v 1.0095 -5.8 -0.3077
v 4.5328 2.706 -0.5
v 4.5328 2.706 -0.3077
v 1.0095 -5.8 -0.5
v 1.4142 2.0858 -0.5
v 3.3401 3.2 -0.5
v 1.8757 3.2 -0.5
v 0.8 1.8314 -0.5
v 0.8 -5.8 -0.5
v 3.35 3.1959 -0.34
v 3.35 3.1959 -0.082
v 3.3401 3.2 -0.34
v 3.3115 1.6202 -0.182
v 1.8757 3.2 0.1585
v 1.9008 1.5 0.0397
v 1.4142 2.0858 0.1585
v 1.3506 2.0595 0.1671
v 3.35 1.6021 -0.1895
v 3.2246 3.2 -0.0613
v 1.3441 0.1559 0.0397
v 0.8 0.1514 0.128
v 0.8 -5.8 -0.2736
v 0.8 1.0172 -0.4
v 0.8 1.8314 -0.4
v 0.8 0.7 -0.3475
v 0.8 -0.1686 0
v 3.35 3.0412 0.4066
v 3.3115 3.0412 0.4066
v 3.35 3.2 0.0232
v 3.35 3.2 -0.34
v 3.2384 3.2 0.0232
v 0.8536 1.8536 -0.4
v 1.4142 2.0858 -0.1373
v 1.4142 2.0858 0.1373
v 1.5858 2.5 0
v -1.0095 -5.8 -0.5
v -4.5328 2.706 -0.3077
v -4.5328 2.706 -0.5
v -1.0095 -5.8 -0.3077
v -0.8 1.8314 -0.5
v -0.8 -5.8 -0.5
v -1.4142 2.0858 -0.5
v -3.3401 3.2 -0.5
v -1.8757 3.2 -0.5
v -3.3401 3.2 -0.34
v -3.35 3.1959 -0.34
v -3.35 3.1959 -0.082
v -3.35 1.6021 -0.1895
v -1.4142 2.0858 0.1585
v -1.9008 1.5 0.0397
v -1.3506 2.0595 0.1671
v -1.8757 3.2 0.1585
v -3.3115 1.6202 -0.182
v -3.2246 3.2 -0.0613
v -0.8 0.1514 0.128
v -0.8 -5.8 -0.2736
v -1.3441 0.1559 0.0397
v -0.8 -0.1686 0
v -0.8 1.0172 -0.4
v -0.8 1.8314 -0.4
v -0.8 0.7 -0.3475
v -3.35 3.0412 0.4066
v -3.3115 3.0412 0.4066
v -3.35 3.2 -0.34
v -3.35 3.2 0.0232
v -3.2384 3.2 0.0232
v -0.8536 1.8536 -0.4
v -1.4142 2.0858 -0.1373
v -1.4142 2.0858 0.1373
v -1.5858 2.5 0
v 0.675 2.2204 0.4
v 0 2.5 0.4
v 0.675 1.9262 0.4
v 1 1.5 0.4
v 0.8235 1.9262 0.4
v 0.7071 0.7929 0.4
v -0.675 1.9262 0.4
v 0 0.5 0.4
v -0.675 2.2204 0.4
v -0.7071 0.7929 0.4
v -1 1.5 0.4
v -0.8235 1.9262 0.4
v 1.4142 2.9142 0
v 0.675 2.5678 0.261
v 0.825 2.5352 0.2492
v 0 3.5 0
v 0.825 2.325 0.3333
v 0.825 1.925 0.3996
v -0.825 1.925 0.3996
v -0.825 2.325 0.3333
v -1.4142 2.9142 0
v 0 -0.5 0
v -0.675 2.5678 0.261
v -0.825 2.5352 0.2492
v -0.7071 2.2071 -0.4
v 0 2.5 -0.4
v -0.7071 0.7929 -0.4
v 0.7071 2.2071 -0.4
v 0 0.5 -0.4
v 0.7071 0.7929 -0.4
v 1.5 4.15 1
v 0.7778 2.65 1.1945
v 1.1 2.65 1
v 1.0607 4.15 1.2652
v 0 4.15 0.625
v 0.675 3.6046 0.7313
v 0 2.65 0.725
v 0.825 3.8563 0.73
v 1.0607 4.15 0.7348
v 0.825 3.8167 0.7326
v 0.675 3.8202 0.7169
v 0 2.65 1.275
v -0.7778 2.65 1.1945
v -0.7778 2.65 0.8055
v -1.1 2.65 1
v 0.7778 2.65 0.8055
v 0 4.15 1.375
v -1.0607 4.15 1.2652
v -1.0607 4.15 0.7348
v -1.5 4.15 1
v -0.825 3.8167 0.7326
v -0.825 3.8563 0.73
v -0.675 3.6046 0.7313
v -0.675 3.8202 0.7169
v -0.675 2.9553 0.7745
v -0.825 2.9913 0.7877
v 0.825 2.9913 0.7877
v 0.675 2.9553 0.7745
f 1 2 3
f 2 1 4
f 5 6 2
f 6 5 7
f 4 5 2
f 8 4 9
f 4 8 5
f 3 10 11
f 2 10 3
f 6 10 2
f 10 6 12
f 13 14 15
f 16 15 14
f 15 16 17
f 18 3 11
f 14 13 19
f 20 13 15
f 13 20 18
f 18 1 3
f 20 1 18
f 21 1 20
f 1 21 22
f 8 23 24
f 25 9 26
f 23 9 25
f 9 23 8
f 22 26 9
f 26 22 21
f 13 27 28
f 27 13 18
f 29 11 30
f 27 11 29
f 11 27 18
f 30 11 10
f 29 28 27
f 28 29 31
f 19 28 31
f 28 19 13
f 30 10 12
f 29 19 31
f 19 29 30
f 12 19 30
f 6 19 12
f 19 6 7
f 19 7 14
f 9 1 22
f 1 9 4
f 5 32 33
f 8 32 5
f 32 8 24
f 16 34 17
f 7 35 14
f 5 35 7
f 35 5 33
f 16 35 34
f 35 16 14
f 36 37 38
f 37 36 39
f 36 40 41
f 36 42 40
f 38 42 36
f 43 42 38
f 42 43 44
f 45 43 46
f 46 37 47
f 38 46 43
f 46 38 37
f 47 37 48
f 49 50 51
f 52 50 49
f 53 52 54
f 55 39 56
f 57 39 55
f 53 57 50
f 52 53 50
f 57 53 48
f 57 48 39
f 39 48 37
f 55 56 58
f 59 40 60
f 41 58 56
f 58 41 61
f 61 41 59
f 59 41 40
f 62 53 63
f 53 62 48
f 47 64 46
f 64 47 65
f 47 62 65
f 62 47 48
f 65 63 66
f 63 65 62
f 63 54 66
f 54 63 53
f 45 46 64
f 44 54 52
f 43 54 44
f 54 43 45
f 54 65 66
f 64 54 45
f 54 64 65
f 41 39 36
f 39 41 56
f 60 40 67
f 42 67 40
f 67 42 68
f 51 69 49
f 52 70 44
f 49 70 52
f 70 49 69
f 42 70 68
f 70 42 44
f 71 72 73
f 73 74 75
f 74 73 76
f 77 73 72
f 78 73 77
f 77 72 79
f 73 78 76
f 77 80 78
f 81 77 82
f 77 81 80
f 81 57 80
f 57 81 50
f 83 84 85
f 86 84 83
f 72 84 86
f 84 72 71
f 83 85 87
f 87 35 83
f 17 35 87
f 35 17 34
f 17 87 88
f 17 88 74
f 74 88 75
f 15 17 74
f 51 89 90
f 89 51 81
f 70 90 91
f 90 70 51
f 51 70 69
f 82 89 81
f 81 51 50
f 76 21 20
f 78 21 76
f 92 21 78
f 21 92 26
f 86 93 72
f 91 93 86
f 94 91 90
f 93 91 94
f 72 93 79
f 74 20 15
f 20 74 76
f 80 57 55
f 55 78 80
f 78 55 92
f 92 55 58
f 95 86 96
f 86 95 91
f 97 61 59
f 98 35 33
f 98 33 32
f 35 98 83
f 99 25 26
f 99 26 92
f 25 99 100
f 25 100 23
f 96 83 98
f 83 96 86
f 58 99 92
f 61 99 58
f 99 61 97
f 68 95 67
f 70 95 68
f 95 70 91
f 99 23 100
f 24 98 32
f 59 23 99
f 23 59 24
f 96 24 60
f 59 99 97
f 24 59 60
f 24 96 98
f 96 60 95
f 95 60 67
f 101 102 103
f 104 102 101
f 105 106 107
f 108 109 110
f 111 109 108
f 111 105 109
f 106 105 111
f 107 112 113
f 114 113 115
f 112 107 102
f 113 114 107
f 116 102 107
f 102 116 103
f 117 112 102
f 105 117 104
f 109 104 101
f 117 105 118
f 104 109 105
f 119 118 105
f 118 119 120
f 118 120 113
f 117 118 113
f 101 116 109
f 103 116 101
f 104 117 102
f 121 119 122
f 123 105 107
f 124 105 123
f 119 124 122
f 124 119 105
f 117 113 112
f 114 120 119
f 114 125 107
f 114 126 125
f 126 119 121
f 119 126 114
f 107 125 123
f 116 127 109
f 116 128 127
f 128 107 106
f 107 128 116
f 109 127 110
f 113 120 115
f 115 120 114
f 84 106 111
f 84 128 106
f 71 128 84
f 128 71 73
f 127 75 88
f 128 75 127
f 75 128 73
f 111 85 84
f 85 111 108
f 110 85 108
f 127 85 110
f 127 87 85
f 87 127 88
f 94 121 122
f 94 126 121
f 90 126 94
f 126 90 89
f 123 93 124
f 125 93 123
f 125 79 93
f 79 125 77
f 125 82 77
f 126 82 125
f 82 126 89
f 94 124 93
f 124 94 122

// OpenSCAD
module first_wedge() {
	difference() {
		cube(size = [10,10,1], center = true);
		translate(v = [5, 0, 0.2]) {
			rotate(a = 10,  v = [0, 1, 0])
			cube(size = [11,11,1], center = true);
		}
	}
}

module second_wedge()
{
	translate(v = [-2, 0, 0]) {
		rotate(a = -45 / 2, v = [0, 0, 1]) {
			difference() {
				first_wedge();
				rotate(a = 45 / 2, v = [0, 0, 1]) {
					translate(v = [-2.70, 0, 0]) {
						cube(size = [11, 16, 5], center = true);
					}
				}
			}
		}
	}
}

module fin()
{
	scale(v = [0.2, 0.2, 0.2]) {
		rotate(a = -90, v = [0, 1, 0]) {
			second_wedge();
		}
	}

}

module third_wedge()
{
	difference() {
		union() {
			translate(v = [3.25, 2.5, -0.5]) 
				fin();
			second_wedge();
		}
		translate(v = [0, 5.7, 0])
			cube(size = [10, 5, 5], center = true);
		translate(v = [0, -8.3, 0])
			cube(size = [10, 5, 5], center = true);
	}
}

module fourth_wedge()
{
	difference() {
		third_wedge();
		translate(v = [0, 3.5, 0])
			cylinder(h = 5, r1 = 2, r2 = 2, center = true);
	}
}

module pod()
{
	union() {
		cylinder(h = 0.4, r1 = 2, r2 = 1, center = true);
		translate(v = [0, 0, -0.4])
			cylinder(h = 0.4, r1 = 1, r2 = 2, center = true);
	}
}

module fifth_wedge()
{
	union() {
		fourth_wedge();
		mirror(v = [1, 0, 0])
			fourth_wedge();
		translate(v = [0, 1.5, 0.20])
			pod();
	}
}

module bridge_buttress()
{
	rotate(a = 20, v = [1, 0, 0])
		cube(size = [0.15, 2.4, 0.35], center = true);
}

module bridge()
{
	rotate(a = 90, v = [1, 0, 0])
		scale(v = [1, 0.25, 1])
			cylinder(h = 1.5, r1 = 1.5, r2 = 1.1, center = true);
	
}

module sixth_wedge()
{
	union() {
		translate(v = [0, 3.4, 1.0])
			bridge();
		fifth_wedge();
		translate(v = [0.75, 2.85, 0.55])
			bridge_buttress();
		translate(v = [-0.75, 2.85, 0.55])
			bridge_buttress();
	}
}

$fn = 8;
sixth_wedge();
